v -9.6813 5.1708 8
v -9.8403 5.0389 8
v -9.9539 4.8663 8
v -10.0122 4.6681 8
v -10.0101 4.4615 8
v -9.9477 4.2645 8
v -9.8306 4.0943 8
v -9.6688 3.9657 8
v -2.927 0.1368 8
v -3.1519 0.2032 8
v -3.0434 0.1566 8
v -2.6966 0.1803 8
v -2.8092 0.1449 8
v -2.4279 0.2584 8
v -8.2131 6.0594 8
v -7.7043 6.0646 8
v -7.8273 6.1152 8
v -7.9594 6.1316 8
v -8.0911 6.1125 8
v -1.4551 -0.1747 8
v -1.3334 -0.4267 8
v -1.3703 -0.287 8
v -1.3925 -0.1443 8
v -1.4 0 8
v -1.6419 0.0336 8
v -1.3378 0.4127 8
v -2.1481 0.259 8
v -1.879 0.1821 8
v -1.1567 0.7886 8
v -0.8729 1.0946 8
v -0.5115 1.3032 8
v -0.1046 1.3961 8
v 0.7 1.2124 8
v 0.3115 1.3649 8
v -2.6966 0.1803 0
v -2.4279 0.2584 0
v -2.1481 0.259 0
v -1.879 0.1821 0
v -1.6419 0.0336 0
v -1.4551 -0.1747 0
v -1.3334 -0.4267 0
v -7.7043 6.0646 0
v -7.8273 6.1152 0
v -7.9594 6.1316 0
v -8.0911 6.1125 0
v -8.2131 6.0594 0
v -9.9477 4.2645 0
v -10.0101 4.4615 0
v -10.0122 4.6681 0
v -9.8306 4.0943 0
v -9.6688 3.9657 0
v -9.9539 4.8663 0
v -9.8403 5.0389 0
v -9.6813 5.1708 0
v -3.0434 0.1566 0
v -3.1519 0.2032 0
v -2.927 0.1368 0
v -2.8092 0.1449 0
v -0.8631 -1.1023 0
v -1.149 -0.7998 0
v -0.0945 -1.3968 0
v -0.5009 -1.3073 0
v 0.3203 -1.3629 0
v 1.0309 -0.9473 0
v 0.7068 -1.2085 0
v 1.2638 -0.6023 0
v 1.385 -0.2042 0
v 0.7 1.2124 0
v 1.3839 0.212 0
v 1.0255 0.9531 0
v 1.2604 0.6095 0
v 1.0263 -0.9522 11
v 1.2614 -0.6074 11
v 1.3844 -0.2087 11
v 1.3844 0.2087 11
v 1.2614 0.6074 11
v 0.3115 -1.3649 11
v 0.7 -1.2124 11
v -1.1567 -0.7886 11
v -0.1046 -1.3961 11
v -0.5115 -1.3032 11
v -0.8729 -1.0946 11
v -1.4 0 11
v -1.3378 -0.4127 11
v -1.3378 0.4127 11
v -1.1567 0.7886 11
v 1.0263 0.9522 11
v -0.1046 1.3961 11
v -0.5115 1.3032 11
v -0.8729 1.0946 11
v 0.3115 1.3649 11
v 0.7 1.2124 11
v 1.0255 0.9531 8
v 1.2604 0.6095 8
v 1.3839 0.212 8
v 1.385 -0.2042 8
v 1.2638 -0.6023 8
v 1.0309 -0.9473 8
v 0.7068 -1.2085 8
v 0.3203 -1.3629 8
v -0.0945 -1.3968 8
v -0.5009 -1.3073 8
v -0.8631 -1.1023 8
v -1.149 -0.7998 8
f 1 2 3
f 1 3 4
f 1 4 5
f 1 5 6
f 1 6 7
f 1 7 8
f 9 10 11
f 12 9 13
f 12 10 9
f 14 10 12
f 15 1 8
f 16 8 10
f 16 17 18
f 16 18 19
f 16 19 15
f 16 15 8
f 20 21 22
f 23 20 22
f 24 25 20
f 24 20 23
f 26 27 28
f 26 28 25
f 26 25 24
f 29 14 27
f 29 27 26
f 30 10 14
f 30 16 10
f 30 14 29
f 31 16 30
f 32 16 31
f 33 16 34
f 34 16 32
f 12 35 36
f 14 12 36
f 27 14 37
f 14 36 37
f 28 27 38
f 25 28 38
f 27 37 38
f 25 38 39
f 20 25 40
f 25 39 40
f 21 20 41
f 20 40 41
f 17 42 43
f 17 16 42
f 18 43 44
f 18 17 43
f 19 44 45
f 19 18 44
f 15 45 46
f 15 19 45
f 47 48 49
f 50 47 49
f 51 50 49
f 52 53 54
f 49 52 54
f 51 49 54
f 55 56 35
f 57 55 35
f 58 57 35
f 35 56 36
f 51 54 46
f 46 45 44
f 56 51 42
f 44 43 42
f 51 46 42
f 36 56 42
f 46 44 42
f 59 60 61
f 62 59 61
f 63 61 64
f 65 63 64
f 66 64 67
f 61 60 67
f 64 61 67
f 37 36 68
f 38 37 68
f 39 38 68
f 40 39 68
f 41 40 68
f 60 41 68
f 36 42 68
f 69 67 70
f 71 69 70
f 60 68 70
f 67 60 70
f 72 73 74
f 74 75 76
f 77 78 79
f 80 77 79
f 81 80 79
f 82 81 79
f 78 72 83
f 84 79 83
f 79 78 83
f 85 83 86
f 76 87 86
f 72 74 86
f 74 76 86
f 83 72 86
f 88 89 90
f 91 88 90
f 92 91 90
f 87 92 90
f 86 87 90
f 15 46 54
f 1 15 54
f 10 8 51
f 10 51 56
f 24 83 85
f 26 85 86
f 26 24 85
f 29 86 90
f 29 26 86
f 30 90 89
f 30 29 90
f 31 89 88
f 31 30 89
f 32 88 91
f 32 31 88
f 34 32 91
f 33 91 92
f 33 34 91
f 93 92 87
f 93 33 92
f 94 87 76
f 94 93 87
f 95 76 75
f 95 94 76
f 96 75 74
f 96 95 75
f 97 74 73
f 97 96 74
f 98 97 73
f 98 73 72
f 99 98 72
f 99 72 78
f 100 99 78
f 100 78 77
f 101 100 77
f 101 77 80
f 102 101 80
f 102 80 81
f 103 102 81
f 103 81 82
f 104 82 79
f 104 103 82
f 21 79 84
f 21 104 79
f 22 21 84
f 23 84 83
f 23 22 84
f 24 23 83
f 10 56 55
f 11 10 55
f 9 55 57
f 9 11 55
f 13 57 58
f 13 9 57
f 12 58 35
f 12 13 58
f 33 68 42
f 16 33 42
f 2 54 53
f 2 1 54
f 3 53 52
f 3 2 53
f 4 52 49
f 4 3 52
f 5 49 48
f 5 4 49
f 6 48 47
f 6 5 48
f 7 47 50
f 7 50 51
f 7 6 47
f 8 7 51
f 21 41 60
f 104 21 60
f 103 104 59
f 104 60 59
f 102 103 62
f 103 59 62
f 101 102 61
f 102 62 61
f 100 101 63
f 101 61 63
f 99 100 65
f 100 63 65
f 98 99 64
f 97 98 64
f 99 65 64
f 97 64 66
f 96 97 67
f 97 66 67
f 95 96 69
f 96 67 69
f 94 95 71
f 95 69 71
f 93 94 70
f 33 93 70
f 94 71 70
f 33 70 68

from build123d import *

# Parameters (mm, degrees)
EXTRUDE_1_DEPTH = 8
FILLET_1_R      = 0.5
FILLET_2_R      = 0.7
EXTRUDE_START   = -8
SKETCH_2_R      = 1.4
EXTRUDE_2_DEPTH = 3


with BuildPart() as part:
    # 草图1 → 凸台-拉伸1 (new body)
    with BuildSketch(Plane.XY):
        with BuildLine():
            Line((0.7, 1.212435565), (-7.960254038, 6.212435565))
            Line((-7.960254038, 6.212435565), (-10.694228634, 4.557735027))
            Line((-10.694228634, 4.557735027), (-2.9, 0.057735027))
            ThreePointArc((-2.9, 0.057735027), (-1.990417738, 0.223935223), (-1.333398647, -0.426670889))
            ThreePointArc((-1.333398647, -0.426670889), (0.878615931, -1.089969746), (0.7, 1.212435565))
        make_face()
    extrude(amount=EXTRUDE_1_DEPTH)

    # 圆角1
    fillet_1_edges = [part.edges().sort_by_distance(p)[0] for p in [
        (-7.960254038, 6.212435565, 4),
        (-2.9, 0.057735027, 4),
    ]]
    fillet(fillet_1_edges, radius=FILLET_1_R)

    # 圆角2
    fillet_2_edges = [part.edges().sort_by_distance(p)[0] for p in [
        (-10.694228634, 4.557735027, 4),
    ]]
    fillet(fillet_2_edges, radius=FILLET_2_R)

    # 草图2 → 凸台-拉伸2 (add)
    with BuildSketch(Plane(origin=(0, 0, 0), x_dir=(-1, 0, 0), z_dir=(0, 0, -1)).offset(EXTRUDE_START)):
        Circle(SKETCH_2_R)
    extrude(amount=-EXTRUDE_2_DEPTH)


solid = part.part
